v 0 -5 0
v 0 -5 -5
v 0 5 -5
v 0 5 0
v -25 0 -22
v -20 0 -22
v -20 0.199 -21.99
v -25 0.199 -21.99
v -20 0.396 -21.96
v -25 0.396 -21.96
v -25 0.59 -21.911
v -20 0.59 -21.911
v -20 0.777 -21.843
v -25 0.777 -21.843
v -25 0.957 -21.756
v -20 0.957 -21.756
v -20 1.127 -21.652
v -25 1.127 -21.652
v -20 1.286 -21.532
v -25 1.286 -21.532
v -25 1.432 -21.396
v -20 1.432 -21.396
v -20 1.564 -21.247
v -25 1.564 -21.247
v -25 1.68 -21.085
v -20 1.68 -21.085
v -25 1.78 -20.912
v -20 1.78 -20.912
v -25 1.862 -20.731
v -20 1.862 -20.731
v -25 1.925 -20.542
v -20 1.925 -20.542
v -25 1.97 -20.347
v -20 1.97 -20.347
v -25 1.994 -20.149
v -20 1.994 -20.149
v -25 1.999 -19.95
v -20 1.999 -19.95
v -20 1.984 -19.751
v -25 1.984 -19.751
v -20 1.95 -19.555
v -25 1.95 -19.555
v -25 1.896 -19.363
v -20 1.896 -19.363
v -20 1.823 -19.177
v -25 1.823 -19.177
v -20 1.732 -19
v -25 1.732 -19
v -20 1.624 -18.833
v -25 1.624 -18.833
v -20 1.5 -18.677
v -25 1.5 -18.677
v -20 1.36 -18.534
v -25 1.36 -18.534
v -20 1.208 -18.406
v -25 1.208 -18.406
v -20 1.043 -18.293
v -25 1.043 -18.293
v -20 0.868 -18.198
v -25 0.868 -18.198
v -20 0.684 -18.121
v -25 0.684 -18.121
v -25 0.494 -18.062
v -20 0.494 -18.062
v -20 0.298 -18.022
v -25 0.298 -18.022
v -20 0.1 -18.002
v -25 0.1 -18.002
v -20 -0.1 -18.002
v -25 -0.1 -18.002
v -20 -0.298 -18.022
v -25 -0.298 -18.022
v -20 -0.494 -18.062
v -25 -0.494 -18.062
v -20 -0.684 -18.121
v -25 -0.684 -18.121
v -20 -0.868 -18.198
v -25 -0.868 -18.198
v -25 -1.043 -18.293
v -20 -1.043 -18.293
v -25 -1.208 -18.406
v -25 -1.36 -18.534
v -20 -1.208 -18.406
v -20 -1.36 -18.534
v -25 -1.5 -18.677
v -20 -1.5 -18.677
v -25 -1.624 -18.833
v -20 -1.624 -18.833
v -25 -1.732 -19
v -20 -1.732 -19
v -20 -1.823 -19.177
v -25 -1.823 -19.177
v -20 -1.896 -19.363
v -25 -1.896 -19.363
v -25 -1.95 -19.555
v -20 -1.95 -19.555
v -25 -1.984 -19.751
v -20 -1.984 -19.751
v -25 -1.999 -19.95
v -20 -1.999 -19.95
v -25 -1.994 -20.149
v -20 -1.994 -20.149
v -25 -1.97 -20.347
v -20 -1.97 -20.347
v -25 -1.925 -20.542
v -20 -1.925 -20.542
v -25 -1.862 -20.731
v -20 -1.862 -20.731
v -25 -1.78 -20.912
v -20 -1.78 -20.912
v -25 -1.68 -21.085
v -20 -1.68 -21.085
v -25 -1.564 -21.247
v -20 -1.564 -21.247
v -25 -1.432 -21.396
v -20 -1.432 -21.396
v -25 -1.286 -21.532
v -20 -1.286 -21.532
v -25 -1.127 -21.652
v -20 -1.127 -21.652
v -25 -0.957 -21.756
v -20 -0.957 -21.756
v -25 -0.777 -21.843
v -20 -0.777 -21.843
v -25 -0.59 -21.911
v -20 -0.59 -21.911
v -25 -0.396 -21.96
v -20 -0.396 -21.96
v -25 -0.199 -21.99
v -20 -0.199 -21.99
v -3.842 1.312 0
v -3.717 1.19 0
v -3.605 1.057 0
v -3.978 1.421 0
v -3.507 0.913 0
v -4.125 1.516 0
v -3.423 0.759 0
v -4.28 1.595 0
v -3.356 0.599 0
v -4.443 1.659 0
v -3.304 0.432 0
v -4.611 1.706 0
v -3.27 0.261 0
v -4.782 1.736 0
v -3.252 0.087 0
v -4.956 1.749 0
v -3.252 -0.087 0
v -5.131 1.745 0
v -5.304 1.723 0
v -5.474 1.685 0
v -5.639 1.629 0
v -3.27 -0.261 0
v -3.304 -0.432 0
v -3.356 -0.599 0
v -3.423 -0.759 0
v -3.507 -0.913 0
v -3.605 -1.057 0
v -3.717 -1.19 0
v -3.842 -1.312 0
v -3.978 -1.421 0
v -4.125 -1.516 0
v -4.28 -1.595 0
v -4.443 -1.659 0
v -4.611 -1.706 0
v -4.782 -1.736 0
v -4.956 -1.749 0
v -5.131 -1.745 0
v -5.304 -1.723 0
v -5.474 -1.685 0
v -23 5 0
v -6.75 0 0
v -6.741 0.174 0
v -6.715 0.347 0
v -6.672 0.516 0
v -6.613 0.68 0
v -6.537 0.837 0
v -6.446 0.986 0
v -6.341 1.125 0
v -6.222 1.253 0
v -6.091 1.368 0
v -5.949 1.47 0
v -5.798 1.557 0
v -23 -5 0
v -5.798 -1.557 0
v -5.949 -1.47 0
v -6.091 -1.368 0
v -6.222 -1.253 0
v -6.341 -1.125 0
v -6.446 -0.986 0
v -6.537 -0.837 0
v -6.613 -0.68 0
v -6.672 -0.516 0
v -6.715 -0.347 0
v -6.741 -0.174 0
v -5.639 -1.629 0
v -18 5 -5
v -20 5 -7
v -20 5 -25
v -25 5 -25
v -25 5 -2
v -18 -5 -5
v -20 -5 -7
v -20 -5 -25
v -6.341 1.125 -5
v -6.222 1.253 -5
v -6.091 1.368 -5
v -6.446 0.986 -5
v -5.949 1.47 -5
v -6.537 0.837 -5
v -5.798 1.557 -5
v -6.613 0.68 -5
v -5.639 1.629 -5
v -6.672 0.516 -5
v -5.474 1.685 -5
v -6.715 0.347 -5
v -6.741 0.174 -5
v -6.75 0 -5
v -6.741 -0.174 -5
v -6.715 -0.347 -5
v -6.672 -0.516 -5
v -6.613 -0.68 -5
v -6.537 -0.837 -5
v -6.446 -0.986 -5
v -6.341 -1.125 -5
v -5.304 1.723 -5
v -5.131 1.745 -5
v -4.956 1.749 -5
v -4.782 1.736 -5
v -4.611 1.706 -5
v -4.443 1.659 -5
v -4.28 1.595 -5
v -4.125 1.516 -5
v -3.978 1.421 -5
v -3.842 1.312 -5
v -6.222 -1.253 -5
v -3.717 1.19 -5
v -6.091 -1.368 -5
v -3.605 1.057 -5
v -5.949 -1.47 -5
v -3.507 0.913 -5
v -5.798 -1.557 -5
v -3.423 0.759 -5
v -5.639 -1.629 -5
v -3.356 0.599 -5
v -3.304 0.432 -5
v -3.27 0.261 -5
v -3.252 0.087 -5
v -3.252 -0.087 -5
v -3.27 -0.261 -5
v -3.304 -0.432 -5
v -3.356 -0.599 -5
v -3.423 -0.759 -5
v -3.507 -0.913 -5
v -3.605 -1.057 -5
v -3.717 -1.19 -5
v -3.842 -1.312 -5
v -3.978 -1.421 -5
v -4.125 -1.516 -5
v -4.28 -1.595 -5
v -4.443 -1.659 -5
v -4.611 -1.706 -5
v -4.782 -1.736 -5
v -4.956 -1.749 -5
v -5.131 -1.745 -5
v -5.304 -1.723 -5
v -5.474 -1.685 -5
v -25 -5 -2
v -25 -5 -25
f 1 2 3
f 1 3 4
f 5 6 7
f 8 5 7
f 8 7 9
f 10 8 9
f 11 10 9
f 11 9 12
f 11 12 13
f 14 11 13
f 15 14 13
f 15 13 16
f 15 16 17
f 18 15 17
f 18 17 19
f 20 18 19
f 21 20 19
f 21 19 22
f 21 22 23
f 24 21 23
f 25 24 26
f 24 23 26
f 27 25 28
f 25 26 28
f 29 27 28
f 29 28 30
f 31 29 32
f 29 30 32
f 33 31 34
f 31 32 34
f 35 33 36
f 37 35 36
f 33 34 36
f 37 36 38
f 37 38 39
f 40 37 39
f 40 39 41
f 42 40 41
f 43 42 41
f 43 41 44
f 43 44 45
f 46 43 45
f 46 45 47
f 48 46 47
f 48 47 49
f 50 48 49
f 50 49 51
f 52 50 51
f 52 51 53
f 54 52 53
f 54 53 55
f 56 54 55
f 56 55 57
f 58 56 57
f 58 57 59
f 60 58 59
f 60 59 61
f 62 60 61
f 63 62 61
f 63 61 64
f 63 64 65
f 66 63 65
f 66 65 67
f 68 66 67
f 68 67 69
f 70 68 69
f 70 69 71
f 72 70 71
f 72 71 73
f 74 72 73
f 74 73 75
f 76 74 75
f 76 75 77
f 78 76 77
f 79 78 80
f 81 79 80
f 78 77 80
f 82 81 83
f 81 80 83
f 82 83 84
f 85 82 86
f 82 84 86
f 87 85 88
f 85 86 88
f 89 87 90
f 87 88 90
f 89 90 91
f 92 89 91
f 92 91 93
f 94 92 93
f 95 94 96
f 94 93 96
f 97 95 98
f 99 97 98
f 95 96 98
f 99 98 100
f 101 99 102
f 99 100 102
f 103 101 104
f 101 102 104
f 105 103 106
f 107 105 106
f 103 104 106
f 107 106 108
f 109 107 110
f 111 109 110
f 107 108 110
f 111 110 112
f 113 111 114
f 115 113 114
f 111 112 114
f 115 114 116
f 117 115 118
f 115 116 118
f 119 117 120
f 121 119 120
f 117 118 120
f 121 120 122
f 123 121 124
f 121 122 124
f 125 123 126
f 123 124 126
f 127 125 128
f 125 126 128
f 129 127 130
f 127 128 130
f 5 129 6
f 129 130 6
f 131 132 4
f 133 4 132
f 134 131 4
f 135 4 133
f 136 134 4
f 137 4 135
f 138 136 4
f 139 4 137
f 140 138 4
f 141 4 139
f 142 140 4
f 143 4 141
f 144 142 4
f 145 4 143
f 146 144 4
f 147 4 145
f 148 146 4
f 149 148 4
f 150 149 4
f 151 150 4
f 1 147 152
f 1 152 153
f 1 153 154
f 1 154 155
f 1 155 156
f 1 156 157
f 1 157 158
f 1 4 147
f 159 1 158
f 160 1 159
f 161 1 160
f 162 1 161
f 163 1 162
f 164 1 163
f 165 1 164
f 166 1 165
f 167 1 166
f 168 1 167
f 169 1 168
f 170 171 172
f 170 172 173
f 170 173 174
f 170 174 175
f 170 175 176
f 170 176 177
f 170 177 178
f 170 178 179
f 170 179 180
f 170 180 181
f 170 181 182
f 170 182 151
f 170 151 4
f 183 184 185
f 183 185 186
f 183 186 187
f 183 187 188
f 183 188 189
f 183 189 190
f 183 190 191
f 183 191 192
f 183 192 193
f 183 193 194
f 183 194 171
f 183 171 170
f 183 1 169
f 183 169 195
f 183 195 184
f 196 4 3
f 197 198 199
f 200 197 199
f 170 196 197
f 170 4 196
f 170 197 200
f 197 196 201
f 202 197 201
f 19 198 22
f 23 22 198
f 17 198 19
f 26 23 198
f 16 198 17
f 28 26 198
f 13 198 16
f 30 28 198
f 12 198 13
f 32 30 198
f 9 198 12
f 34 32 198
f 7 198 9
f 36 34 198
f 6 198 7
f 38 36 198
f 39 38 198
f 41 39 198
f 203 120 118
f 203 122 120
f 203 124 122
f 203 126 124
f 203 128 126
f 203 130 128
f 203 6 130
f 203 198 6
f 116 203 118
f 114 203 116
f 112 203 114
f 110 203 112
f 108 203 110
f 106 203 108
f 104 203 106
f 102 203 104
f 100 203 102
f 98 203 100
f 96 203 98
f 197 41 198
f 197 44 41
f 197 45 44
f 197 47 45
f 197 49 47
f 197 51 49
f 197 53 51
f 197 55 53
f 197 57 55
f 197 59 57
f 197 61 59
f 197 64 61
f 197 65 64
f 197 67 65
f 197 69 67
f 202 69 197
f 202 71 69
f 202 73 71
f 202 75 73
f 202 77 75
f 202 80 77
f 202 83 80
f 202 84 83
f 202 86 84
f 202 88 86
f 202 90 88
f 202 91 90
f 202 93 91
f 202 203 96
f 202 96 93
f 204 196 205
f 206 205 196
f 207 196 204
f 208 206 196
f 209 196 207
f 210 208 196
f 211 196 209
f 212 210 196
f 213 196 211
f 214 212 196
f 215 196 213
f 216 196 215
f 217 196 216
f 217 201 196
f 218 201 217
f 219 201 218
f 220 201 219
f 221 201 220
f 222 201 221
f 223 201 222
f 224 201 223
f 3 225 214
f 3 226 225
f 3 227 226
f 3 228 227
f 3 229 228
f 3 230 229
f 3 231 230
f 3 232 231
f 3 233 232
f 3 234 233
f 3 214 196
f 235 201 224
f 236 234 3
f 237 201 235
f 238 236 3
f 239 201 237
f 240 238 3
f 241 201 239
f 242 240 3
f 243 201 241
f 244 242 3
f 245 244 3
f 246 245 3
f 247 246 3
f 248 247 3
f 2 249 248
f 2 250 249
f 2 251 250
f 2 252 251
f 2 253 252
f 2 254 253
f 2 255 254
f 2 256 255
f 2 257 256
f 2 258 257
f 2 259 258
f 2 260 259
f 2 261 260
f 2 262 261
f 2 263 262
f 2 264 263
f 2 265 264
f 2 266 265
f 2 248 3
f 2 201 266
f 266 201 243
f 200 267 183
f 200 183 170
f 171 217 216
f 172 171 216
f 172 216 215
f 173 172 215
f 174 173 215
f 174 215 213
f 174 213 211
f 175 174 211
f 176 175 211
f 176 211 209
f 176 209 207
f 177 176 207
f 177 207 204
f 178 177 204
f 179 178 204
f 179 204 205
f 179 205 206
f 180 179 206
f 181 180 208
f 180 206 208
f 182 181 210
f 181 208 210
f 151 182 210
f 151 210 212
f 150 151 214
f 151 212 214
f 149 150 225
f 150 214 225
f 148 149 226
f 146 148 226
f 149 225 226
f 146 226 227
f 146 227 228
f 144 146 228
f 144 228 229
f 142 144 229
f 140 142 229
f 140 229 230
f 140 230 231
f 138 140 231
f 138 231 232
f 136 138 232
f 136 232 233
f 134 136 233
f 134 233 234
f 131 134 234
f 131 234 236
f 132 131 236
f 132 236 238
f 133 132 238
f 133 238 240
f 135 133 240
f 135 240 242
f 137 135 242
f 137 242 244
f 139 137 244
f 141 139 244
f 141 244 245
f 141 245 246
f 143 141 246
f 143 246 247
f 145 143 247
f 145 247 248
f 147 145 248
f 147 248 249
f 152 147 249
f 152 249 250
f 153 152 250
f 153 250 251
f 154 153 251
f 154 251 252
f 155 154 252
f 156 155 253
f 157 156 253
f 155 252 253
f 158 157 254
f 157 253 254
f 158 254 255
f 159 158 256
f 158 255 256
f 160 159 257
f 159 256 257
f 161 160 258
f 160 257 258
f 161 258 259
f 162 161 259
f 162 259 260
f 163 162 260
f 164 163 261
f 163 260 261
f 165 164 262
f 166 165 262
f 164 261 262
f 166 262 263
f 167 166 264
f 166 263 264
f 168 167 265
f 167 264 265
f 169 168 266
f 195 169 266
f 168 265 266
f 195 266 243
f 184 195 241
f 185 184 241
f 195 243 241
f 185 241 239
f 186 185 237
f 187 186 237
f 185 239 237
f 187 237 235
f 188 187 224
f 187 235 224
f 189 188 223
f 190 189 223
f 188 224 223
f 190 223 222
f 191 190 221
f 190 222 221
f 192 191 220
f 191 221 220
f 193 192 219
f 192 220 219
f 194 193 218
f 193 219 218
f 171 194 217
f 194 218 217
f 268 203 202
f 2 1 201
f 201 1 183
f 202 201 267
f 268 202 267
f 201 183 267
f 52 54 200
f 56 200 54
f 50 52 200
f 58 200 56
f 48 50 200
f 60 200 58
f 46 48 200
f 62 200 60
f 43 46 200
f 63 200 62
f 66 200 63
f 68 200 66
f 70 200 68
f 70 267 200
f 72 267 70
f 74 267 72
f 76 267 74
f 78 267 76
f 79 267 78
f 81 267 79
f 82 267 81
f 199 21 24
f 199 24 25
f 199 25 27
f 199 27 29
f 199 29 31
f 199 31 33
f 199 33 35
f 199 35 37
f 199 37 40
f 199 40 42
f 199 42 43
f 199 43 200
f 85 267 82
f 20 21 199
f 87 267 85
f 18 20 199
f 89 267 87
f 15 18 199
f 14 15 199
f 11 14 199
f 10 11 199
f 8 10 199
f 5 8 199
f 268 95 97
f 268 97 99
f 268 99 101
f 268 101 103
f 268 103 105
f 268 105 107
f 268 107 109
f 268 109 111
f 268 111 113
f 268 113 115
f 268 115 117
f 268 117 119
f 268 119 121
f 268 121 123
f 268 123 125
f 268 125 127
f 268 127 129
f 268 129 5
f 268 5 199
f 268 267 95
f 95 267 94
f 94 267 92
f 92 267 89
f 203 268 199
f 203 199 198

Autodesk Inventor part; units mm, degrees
ref_plane "YZ Plane" through (0, 0, 0) normal (1, 0, 0) x (0, 1, 0)
ref_plane "XZ Plane" through (0, 0, 0) normal (0, 1, 0) x (-1, 0, 0)
ref_plane "XY Plane" through (0, 0, 0) normal (0, 0, 1) x (1, 0, 0)
sketch "Sketch1" plane through (0, 0, 0) normal (0, 1, 0) x (-1, 0, 0)
  line L0 (0, 0) -> (25, 0)
  line L1 (25, 0) -> (25, -25)
  line L2 (25, -25) -> (20, -25)
  line L3 (20, -25) -> (20, -5)
  line L4 (20, -5) -> (0, -5)
  line L5 (0, -5) -> (0, 0)
  dimension "d0" = 5
  dimension "d1" = 25
  dimension "d2" = 25
extrude "Extrusion1" add sketch "Sketch1" along normal mid plane 10
sketch "Sketch2" plane through (-20, -5, -25) normal (1, 0, 0) x (0, 0, -1)
  circle A0 centre (-5, 5) radius 2
  line L0 (-25, 0) -> (-25, 10) projected
  line L1 (-20, 10) -> (0, 10) projected
  line L2 (0, 0) -> (0, 10) projected
  point P0 (-25, 5)
  point P1 (-25, 5)
  dimension "d5" = 4
  dimension "d9" = 5
extrude "Extrusion2" cut sketch "Sketch2" against normal through all
sketch "Sketch3" plane through (0, 5, -5) normal (0, 0, -1) x (-1, 0, 0)
  circle A0 centre (5, -5) radius 1.75
  line L0 (0, 0) -> (0, -10) projected
  line L1 (0, 0) -> (20, 0) projected
  point P0 (0, -5)
  point P1 (0, -5)
  point P2 (0, -5)
  dimension "d8" = 3.5
  dimension "d11" = 5
extrude "Extrusion3" cut sketch "Sketch3" against normal blind 10
chamfer "Chamfer1" distance 2 angle 45 2 edges at (-25, 0, 0) (-20, 0, -5)
properties part number "L connection"
